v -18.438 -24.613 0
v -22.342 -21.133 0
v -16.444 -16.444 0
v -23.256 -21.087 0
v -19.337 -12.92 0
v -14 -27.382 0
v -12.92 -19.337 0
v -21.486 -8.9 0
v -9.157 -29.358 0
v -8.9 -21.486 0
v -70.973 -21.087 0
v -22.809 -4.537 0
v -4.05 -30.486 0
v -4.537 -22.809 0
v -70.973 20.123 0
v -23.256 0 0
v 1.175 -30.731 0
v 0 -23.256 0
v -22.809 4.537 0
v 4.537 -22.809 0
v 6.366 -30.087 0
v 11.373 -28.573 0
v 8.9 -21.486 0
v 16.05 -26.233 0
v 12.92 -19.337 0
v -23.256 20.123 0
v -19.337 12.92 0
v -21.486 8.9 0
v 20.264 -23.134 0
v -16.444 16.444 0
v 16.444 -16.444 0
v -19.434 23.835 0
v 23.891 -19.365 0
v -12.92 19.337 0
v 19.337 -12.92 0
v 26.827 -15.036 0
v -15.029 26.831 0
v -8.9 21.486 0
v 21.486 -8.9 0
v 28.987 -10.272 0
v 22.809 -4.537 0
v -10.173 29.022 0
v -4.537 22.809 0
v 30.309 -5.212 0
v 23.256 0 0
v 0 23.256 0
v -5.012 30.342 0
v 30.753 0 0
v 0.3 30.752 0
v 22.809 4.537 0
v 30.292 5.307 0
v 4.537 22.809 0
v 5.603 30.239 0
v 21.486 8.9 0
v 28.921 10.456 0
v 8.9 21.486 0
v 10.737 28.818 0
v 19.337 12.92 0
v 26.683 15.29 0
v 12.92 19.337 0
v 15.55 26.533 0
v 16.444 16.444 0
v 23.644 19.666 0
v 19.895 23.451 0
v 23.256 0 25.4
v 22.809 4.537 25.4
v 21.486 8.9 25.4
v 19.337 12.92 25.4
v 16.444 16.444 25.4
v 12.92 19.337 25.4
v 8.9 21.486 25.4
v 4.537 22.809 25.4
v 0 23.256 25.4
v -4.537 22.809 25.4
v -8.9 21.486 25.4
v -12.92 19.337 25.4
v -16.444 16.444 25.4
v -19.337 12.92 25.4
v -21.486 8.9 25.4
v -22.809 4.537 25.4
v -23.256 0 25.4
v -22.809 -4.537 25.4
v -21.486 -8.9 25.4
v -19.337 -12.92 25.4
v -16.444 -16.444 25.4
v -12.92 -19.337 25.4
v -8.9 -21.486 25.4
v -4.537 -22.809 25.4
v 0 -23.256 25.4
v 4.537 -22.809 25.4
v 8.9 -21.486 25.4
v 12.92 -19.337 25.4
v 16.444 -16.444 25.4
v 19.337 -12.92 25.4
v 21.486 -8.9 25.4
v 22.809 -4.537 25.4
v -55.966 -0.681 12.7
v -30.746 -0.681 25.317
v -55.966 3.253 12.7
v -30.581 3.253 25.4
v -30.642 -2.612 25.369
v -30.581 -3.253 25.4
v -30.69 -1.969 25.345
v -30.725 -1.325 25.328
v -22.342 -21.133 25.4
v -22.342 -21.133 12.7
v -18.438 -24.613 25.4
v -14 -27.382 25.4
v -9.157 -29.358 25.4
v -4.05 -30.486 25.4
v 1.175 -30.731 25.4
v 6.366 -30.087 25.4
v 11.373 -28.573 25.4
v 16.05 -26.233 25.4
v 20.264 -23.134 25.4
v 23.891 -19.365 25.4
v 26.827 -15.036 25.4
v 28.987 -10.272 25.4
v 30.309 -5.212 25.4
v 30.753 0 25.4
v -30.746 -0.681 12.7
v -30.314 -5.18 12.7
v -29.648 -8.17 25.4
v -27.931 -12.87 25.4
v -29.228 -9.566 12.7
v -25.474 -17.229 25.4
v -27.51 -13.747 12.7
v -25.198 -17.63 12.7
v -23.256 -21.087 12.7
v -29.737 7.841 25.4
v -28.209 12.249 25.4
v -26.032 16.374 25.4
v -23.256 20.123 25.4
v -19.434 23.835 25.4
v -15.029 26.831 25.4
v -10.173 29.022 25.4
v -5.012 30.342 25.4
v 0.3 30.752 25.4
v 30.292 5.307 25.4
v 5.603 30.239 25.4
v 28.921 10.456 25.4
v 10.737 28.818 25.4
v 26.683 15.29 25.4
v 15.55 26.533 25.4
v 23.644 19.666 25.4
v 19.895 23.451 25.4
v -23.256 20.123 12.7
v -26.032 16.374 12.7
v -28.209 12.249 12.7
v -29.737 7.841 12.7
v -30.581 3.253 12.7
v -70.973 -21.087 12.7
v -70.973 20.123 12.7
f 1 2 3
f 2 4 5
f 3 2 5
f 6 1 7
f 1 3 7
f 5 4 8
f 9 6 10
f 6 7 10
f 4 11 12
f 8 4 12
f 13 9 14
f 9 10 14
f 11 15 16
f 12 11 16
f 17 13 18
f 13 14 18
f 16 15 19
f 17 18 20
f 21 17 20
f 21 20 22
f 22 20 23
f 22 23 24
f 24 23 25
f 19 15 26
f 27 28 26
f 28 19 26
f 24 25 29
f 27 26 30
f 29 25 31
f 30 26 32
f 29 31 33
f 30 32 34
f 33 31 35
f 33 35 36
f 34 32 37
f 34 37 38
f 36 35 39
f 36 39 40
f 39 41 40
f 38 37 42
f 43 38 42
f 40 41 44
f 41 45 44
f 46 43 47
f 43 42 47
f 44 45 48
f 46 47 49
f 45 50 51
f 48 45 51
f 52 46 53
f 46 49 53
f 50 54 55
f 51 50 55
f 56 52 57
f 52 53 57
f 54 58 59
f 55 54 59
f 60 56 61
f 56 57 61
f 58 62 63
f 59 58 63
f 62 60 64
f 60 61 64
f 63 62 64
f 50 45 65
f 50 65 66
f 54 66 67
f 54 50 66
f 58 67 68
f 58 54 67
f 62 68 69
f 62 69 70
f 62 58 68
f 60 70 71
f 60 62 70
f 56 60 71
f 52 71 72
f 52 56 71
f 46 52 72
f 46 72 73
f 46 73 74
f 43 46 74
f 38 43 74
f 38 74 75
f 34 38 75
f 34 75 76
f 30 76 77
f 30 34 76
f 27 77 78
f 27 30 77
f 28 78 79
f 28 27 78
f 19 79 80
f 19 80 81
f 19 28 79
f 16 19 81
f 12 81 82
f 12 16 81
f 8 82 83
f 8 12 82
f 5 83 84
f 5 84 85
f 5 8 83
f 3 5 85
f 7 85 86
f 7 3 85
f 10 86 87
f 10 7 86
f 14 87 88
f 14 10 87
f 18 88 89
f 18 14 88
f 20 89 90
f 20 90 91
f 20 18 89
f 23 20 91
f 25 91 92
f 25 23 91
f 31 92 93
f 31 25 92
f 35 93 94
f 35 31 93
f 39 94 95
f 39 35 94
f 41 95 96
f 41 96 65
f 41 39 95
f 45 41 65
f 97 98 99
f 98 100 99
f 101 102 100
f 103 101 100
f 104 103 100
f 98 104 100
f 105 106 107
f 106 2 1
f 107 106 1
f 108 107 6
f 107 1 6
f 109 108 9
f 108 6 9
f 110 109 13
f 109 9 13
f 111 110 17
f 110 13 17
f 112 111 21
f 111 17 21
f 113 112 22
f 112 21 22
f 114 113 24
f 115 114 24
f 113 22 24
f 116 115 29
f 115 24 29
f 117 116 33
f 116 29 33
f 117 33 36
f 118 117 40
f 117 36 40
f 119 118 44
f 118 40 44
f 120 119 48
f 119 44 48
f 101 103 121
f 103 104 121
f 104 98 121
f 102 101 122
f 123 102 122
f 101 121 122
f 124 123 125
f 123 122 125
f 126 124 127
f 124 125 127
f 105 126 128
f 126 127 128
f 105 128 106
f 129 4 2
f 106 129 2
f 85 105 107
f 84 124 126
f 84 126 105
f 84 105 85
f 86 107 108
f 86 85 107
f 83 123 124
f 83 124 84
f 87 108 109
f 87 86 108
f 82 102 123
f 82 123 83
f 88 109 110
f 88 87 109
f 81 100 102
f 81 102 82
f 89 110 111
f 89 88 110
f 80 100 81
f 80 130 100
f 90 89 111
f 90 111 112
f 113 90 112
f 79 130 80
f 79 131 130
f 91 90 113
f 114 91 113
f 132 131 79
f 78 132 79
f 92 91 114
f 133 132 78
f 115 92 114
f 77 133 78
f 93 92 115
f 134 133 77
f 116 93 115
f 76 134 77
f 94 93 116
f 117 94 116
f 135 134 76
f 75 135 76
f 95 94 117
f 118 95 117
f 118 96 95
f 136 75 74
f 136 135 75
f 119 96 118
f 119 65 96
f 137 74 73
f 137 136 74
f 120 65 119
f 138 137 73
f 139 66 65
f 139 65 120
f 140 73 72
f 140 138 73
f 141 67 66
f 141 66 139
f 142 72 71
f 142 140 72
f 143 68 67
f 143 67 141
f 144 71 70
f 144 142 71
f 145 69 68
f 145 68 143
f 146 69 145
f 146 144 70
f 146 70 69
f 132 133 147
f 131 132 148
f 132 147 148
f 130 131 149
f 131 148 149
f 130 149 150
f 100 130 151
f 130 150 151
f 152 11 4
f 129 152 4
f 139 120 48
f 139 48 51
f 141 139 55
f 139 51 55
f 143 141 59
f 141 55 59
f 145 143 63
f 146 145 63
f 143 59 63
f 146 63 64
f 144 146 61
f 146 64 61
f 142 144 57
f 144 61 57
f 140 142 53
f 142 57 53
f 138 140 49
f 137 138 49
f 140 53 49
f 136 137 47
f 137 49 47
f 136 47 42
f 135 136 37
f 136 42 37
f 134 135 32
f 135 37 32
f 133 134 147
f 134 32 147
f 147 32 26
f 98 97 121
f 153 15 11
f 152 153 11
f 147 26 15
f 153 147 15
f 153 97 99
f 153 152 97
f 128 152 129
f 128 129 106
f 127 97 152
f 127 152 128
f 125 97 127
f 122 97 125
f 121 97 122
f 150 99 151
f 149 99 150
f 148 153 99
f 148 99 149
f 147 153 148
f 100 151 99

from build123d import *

# Parameters (mm, degrees)
F0_R     = 23.255918
F1_DEPTH = 25.4
F2_DEPTH = 12.7
F4_DEPTH = 12.7
F6_DEPTH = 25.4


with BuildPart() as f1:
    # F0 (on Top) → F1 (new body)
    with BuildSketch(Plane.XY):
        with BuildLine():
            ThreePointArc((30.753419, 0), (10.737173, 28.818152), (-23.255918, 20.122997))
            ThreePointArc((-23.255918, 20.122997), (-30.745882, -0.680806), (-22.342394, -21.13268))
            ThreePointArc((-22.342394, -21.13268), (11.372505, -28.573395), (30.753419, 0))
        make_face()
        Circle(F0_R, mode=Mode.SUBTRACT)
    extrude(amount=F1_DEPTH)

    # F0 (on Top) → F2 (join)
    with BuildSketch(Plane.XY):
        with BuildLine():
            Line((-23.255918, 20.122997), (-70.972726, 20.122997))
            Line((-70.972726, 20.122997), (-70.972726, -21.086972))
            Line((-70.972726, -21.086972), (-23.255918, -21.086972))
            Line((-23.255918, -21.086972), (-22.342394, -21.13268))
            ThreePointArc((-22.342394, -21.13268), (-30.745882, -0.680806), (-23.255918, 20.122997))
        make_face()
    extrude(amount=F2_DEPTH)

    # F3 (on face) → F4 (join)
    with BuildSketch(Plane.XY.offset(12.7)):
        with BuildLine():
            ThreePointArc((-30.745882, -0.680806), (-30.726394, 1.288977), (-30.580838, 3.253472))
            Line((-30.580838, 3.253472), (-55.966172, 3.253472))
            Line((-55.966172, 3.253472), (-55.966172, -0.680806))
            Line((-55.966172, -0.680806), (-30.745882, -0.680806))
        make_face()
    extrude(amount=F4_DEPTH)

    # F5 (on face) → F6 (cut)
    with BuildSketch(Plane(origin=(0, 3.253472, 0), x_dir=(-1, 0, 0), z_dir=(0, 1, 0))):
        Polygon((55.966172, 25.4), (30.580838, 25.4), (55.966172, 12.7), align=None)
    extrude(amount=-F6_DEPTH, mode=Mode.SUBTRACT)


solid = f1.part
